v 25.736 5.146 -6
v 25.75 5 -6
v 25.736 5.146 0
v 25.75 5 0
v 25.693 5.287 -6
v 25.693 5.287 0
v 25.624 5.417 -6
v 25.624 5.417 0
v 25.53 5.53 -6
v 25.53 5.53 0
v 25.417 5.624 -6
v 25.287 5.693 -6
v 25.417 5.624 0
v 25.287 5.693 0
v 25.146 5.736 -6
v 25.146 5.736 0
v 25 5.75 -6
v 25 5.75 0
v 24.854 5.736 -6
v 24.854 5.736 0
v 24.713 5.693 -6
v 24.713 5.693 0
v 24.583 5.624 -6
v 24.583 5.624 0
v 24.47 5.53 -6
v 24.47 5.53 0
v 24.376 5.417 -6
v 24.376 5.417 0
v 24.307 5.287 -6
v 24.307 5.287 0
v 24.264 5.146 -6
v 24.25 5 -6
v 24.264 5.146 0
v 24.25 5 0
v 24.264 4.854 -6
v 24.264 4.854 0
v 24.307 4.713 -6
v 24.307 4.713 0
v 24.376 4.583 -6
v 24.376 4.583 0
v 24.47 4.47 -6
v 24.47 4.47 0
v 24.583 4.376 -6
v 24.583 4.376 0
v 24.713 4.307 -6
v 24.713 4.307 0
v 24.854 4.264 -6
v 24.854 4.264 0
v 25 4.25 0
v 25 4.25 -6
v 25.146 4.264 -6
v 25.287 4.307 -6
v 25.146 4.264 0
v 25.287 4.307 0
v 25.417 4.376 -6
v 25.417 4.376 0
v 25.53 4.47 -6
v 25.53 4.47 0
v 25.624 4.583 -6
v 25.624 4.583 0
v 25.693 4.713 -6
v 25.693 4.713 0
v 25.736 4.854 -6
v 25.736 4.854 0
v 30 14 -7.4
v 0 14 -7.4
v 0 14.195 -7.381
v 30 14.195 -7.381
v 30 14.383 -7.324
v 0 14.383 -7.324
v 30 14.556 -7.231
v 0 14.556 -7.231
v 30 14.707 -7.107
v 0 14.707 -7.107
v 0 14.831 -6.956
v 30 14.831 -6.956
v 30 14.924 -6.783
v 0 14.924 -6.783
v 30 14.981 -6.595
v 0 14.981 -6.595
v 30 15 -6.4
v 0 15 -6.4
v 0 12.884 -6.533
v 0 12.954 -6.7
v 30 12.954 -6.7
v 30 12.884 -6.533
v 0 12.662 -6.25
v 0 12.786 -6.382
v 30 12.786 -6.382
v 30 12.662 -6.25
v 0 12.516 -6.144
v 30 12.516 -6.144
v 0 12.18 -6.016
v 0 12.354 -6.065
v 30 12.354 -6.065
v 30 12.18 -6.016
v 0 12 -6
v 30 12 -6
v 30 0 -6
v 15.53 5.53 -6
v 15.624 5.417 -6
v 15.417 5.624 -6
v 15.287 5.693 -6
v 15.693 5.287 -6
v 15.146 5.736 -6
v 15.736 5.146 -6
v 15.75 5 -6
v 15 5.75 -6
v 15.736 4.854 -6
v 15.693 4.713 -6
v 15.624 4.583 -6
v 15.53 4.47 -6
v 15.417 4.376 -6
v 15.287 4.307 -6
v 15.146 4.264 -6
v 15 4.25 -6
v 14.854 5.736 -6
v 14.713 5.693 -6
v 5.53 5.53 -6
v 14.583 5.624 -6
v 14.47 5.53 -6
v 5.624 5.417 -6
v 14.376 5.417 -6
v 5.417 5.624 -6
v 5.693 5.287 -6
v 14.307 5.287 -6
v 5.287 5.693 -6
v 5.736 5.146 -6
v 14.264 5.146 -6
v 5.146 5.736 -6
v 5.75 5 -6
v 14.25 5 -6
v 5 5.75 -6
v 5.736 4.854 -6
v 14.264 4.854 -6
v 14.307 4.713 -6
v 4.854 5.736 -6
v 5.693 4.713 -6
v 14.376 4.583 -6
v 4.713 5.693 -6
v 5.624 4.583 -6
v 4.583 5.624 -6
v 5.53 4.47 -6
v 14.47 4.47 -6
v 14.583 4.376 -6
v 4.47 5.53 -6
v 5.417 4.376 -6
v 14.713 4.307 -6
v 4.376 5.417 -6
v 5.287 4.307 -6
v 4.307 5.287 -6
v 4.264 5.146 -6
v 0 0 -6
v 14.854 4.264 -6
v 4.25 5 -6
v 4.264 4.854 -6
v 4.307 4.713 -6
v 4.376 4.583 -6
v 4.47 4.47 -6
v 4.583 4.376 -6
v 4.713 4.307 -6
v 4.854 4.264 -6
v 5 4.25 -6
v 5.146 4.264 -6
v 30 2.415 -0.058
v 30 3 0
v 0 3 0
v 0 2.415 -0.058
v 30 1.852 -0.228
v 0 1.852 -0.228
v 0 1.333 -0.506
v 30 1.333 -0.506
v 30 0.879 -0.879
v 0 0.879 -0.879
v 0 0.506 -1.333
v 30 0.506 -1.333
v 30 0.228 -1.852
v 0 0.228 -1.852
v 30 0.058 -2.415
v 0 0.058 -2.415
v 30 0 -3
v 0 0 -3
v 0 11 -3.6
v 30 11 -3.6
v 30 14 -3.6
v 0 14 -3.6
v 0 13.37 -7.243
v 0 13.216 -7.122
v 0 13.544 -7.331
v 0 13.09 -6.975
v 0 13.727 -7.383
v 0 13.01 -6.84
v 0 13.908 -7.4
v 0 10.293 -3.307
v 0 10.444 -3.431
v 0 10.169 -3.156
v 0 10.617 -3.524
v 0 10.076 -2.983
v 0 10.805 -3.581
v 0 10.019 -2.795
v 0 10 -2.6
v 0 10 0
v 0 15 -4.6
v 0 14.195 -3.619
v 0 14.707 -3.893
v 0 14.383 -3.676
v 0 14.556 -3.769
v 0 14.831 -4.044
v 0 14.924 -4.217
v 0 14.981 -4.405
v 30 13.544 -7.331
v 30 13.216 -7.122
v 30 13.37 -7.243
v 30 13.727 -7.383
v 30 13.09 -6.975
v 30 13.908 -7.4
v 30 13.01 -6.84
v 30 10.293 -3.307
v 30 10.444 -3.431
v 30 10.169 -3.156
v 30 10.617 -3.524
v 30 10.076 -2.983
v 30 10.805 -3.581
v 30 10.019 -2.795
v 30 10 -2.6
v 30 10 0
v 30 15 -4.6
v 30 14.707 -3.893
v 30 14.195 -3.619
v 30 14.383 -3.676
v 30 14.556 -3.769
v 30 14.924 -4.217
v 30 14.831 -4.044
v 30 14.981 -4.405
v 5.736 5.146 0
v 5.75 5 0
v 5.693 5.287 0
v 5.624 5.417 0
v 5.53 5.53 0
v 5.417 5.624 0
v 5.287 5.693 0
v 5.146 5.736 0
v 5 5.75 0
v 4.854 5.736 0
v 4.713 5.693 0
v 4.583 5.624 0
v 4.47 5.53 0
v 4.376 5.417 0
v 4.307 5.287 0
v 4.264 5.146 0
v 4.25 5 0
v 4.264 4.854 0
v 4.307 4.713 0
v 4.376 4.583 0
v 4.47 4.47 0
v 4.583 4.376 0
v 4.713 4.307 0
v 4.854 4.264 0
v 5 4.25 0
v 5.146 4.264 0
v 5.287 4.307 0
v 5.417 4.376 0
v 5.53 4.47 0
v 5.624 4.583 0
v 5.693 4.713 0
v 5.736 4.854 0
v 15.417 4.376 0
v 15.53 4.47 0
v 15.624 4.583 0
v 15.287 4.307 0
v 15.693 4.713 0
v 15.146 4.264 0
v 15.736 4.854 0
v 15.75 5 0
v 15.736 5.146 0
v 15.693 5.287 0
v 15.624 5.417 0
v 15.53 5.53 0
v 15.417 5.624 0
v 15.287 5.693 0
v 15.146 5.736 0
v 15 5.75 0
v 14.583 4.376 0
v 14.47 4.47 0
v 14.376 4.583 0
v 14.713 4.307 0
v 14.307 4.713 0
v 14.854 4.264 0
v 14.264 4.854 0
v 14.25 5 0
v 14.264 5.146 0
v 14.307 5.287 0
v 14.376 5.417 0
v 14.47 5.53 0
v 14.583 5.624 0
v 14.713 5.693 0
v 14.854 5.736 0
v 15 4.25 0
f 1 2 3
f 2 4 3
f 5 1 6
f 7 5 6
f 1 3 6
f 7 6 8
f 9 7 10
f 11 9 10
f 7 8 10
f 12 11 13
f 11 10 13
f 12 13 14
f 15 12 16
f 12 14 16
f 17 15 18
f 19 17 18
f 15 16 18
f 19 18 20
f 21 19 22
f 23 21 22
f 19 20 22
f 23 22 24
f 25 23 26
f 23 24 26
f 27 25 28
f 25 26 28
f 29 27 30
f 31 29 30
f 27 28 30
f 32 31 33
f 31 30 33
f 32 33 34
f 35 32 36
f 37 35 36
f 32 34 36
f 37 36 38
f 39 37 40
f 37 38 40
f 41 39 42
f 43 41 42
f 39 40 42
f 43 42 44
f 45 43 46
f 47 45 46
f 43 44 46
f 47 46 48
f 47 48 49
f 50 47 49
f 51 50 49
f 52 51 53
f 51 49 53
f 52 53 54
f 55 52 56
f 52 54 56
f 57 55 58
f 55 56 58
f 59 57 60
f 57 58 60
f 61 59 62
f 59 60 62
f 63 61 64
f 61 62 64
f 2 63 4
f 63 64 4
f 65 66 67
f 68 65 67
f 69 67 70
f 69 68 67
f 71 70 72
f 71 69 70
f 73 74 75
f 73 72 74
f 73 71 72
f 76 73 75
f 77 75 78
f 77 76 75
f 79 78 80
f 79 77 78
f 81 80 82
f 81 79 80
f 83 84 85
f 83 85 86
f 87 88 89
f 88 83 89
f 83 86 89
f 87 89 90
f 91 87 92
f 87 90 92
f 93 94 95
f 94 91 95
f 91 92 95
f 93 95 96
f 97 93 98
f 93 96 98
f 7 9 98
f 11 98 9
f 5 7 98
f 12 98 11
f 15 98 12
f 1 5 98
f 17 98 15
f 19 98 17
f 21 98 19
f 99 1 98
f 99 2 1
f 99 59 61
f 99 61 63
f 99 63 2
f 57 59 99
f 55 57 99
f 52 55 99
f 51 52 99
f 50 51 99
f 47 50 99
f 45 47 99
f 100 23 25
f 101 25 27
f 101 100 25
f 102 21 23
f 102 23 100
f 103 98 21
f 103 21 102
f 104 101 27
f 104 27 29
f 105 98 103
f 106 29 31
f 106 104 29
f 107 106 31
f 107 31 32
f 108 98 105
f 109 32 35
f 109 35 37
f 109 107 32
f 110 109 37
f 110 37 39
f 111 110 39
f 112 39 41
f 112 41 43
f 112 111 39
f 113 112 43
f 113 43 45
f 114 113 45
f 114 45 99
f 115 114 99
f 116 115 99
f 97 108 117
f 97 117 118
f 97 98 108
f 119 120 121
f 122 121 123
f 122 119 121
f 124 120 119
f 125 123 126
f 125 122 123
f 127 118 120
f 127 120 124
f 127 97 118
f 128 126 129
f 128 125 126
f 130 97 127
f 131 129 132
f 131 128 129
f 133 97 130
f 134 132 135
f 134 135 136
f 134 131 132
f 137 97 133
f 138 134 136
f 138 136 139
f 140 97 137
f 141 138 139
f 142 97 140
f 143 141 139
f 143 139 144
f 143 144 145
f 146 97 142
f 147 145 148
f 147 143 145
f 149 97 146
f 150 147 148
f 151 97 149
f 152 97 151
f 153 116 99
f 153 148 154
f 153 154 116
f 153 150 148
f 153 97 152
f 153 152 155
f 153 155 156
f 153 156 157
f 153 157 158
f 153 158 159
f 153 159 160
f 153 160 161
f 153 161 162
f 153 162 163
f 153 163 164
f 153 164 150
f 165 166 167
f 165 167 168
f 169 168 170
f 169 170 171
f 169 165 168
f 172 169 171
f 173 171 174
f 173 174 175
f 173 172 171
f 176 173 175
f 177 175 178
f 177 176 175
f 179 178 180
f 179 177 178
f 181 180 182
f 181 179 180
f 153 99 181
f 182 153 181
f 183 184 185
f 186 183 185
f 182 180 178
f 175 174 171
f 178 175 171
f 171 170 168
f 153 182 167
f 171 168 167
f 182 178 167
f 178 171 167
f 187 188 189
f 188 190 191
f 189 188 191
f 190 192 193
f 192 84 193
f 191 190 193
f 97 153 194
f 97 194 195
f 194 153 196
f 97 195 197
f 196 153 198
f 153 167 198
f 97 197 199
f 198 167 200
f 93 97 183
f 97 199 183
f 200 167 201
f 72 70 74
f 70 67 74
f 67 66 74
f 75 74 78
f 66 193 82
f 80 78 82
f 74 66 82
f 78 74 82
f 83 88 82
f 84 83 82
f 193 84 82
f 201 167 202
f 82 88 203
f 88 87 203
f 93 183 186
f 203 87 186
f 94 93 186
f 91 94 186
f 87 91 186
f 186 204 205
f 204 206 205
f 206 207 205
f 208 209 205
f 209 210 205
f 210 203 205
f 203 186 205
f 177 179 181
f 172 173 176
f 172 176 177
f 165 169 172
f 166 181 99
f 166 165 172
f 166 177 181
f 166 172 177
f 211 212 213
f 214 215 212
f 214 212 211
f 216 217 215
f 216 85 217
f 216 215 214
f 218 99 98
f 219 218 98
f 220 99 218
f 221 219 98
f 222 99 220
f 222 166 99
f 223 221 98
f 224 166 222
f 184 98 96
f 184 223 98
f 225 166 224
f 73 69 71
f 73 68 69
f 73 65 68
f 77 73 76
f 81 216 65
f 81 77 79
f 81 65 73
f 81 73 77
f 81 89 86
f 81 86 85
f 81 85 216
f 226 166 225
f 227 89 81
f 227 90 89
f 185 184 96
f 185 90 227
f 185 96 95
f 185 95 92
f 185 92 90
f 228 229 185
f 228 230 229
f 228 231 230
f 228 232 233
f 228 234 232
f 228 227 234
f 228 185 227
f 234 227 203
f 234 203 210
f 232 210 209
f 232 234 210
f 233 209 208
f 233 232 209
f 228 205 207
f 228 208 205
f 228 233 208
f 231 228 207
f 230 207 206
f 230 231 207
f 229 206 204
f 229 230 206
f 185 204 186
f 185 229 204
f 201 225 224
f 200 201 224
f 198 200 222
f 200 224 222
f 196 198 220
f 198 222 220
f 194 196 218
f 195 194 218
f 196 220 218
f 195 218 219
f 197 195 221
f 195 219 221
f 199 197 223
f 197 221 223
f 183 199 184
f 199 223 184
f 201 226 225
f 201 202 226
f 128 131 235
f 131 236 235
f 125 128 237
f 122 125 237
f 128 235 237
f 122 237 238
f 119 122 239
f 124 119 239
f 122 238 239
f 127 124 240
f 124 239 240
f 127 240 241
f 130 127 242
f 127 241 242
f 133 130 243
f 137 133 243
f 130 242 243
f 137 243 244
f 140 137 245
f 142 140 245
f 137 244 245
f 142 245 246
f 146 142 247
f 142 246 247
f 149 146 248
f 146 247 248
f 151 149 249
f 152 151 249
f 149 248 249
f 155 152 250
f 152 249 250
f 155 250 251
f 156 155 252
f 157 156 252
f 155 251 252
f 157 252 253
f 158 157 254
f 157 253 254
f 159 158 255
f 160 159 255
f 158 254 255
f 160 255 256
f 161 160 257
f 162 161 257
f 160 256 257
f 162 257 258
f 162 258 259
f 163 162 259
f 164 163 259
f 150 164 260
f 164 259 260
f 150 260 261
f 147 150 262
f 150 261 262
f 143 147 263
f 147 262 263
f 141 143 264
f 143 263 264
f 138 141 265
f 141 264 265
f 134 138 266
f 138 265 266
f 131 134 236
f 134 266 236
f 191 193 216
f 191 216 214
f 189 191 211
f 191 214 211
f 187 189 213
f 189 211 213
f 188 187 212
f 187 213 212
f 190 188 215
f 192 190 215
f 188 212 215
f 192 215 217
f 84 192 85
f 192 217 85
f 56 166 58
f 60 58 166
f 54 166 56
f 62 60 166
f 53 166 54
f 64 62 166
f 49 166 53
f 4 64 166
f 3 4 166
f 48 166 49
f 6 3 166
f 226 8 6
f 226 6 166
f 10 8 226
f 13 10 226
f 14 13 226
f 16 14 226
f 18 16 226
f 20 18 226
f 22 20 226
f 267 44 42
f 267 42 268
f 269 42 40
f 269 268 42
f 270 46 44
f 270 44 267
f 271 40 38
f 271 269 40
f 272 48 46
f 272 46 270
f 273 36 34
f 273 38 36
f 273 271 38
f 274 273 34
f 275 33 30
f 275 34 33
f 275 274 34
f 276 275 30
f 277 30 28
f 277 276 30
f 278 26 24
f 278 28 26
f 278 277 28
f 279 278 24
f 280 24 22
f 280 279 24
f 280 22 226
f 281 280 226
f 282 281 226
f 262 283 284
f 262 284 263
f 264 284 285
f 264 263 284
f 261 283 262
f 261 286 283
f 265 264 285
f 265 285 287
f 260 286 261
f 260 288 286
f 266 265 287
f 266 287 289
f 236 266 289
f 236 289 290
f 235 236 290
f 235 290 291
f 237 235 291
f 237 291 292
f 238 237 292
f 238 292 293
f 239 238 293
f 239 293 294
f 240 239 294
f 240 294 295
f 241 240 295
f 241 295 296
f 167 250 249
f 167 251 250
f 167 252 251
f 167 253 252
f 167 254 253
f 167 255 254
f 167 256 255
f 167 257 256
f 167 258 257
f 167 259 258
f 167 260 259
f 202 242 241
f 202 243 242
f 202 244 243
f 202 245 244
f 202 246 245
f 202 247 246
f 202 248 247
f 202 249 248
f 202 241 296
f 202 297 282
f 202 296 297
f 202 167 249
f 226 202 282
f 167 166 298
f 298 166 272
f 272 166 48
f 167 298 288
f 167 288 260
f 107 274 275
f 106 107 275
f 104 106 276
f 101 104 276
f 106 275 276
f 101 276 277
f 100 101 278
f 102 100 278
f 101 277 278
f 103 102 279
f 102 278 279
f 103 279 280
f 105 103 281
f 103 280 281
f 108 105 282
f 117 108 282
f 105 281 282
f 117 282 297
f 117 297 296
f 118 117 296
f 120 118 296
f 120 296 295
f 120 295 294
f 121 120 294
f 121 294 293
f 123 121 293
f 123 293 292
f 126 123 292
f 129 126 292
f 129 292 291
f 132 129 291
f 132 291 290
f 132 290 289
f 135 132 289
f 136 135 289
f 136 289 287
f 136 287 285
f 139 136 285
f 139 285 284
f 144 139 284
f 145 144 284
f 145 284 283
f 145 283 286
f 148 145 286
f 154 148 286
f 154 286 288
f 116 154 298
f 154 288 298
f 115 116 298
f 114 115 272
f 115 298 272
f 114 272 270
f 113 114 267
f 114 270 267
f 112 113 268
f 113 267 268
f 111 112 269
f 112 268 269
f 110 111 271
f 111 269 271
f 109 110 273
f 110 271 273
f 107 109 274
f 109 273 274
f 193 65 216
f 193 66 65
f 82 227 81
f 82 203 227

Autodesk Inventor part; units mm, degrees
ref_plane "YZ Plane" through (0, 0, 0) normal (1, 0, 0) x (0, 1, 0)
ref_plane "XZ Plane" through (0, 0, 0) normal (0, 1, 0) x (-1, 0, 0)
ref_plane "XY Plane" through (0, 0, 0) normal (0, 0, 1) x (1, 0, 0)
sketch "Szkic1" plane through (0, 0, 0) normal (1, 0, 0) x (0, 1, 0)
  line L0 (0, 0) -> (10, 0)
  line L1 (10, 0) -> (10, -3.6)
  line L2 (10, -3.6) -> (15, -3.6)
  line L3 (15, -3.6) -> (15, -7.4)
  line L4 (15, -7.4) -> (13, -7.4)
  line L5 (13, -7.4) -> (13, -6)
  line L6 (13, -6) -> (0, -6)
  line L7 (0, -6) -> (0, 0)
  dimension "d1" = 2.4
  dimension "d2" = 3.8
  dimension "d3" = 2
  dimension "d4" = 3.6
  dimension "d5" = 5
  dimension "d6" = 15
extrude "Wyciągnięcie proste1" add sketch "Szkic1" along normal blind 30
fillet "Zaokrąglenie1" radius 3 1 edges at (15, 0, 0)
fillet "Zaokrąglenie2" radius 1 5 edges at (15, 15, -3.6) (15, 10, -3.6) (15, 15, -7.4) (15, 13, -7.4) (15, 13, -6)
sketch "Szkic4" plane through (0, 10, 0) normal (0, 0, 1) x (1, 0, 0)
  line L0 (30, -7) -> (0, -7) projected
  line L1 (30, 0) -> (30, -7) projected
  line L2 (0, 0) -> (30, 0) construction
  line L3 (0, 0) -> (0, -7) projected
  circle A0 centre (25, -5) radius 0.75
  circle A1 centre (15, -5) radius 0.75
  circle A2 centre (5, -5) radius 0.75
  dimension "d27" = 1.5
  dimension "d28" = 2
  dimension "d32" = 10
  dimension "d38" = 30
  dimension "d39" = 15
extrude "Wyciągnięcie proste5" cut sketch "Szkic4" against normal through all
equation "\"d39\" = 0.5 * d38"
properties part number "paliczek_v2" material "PLA"
